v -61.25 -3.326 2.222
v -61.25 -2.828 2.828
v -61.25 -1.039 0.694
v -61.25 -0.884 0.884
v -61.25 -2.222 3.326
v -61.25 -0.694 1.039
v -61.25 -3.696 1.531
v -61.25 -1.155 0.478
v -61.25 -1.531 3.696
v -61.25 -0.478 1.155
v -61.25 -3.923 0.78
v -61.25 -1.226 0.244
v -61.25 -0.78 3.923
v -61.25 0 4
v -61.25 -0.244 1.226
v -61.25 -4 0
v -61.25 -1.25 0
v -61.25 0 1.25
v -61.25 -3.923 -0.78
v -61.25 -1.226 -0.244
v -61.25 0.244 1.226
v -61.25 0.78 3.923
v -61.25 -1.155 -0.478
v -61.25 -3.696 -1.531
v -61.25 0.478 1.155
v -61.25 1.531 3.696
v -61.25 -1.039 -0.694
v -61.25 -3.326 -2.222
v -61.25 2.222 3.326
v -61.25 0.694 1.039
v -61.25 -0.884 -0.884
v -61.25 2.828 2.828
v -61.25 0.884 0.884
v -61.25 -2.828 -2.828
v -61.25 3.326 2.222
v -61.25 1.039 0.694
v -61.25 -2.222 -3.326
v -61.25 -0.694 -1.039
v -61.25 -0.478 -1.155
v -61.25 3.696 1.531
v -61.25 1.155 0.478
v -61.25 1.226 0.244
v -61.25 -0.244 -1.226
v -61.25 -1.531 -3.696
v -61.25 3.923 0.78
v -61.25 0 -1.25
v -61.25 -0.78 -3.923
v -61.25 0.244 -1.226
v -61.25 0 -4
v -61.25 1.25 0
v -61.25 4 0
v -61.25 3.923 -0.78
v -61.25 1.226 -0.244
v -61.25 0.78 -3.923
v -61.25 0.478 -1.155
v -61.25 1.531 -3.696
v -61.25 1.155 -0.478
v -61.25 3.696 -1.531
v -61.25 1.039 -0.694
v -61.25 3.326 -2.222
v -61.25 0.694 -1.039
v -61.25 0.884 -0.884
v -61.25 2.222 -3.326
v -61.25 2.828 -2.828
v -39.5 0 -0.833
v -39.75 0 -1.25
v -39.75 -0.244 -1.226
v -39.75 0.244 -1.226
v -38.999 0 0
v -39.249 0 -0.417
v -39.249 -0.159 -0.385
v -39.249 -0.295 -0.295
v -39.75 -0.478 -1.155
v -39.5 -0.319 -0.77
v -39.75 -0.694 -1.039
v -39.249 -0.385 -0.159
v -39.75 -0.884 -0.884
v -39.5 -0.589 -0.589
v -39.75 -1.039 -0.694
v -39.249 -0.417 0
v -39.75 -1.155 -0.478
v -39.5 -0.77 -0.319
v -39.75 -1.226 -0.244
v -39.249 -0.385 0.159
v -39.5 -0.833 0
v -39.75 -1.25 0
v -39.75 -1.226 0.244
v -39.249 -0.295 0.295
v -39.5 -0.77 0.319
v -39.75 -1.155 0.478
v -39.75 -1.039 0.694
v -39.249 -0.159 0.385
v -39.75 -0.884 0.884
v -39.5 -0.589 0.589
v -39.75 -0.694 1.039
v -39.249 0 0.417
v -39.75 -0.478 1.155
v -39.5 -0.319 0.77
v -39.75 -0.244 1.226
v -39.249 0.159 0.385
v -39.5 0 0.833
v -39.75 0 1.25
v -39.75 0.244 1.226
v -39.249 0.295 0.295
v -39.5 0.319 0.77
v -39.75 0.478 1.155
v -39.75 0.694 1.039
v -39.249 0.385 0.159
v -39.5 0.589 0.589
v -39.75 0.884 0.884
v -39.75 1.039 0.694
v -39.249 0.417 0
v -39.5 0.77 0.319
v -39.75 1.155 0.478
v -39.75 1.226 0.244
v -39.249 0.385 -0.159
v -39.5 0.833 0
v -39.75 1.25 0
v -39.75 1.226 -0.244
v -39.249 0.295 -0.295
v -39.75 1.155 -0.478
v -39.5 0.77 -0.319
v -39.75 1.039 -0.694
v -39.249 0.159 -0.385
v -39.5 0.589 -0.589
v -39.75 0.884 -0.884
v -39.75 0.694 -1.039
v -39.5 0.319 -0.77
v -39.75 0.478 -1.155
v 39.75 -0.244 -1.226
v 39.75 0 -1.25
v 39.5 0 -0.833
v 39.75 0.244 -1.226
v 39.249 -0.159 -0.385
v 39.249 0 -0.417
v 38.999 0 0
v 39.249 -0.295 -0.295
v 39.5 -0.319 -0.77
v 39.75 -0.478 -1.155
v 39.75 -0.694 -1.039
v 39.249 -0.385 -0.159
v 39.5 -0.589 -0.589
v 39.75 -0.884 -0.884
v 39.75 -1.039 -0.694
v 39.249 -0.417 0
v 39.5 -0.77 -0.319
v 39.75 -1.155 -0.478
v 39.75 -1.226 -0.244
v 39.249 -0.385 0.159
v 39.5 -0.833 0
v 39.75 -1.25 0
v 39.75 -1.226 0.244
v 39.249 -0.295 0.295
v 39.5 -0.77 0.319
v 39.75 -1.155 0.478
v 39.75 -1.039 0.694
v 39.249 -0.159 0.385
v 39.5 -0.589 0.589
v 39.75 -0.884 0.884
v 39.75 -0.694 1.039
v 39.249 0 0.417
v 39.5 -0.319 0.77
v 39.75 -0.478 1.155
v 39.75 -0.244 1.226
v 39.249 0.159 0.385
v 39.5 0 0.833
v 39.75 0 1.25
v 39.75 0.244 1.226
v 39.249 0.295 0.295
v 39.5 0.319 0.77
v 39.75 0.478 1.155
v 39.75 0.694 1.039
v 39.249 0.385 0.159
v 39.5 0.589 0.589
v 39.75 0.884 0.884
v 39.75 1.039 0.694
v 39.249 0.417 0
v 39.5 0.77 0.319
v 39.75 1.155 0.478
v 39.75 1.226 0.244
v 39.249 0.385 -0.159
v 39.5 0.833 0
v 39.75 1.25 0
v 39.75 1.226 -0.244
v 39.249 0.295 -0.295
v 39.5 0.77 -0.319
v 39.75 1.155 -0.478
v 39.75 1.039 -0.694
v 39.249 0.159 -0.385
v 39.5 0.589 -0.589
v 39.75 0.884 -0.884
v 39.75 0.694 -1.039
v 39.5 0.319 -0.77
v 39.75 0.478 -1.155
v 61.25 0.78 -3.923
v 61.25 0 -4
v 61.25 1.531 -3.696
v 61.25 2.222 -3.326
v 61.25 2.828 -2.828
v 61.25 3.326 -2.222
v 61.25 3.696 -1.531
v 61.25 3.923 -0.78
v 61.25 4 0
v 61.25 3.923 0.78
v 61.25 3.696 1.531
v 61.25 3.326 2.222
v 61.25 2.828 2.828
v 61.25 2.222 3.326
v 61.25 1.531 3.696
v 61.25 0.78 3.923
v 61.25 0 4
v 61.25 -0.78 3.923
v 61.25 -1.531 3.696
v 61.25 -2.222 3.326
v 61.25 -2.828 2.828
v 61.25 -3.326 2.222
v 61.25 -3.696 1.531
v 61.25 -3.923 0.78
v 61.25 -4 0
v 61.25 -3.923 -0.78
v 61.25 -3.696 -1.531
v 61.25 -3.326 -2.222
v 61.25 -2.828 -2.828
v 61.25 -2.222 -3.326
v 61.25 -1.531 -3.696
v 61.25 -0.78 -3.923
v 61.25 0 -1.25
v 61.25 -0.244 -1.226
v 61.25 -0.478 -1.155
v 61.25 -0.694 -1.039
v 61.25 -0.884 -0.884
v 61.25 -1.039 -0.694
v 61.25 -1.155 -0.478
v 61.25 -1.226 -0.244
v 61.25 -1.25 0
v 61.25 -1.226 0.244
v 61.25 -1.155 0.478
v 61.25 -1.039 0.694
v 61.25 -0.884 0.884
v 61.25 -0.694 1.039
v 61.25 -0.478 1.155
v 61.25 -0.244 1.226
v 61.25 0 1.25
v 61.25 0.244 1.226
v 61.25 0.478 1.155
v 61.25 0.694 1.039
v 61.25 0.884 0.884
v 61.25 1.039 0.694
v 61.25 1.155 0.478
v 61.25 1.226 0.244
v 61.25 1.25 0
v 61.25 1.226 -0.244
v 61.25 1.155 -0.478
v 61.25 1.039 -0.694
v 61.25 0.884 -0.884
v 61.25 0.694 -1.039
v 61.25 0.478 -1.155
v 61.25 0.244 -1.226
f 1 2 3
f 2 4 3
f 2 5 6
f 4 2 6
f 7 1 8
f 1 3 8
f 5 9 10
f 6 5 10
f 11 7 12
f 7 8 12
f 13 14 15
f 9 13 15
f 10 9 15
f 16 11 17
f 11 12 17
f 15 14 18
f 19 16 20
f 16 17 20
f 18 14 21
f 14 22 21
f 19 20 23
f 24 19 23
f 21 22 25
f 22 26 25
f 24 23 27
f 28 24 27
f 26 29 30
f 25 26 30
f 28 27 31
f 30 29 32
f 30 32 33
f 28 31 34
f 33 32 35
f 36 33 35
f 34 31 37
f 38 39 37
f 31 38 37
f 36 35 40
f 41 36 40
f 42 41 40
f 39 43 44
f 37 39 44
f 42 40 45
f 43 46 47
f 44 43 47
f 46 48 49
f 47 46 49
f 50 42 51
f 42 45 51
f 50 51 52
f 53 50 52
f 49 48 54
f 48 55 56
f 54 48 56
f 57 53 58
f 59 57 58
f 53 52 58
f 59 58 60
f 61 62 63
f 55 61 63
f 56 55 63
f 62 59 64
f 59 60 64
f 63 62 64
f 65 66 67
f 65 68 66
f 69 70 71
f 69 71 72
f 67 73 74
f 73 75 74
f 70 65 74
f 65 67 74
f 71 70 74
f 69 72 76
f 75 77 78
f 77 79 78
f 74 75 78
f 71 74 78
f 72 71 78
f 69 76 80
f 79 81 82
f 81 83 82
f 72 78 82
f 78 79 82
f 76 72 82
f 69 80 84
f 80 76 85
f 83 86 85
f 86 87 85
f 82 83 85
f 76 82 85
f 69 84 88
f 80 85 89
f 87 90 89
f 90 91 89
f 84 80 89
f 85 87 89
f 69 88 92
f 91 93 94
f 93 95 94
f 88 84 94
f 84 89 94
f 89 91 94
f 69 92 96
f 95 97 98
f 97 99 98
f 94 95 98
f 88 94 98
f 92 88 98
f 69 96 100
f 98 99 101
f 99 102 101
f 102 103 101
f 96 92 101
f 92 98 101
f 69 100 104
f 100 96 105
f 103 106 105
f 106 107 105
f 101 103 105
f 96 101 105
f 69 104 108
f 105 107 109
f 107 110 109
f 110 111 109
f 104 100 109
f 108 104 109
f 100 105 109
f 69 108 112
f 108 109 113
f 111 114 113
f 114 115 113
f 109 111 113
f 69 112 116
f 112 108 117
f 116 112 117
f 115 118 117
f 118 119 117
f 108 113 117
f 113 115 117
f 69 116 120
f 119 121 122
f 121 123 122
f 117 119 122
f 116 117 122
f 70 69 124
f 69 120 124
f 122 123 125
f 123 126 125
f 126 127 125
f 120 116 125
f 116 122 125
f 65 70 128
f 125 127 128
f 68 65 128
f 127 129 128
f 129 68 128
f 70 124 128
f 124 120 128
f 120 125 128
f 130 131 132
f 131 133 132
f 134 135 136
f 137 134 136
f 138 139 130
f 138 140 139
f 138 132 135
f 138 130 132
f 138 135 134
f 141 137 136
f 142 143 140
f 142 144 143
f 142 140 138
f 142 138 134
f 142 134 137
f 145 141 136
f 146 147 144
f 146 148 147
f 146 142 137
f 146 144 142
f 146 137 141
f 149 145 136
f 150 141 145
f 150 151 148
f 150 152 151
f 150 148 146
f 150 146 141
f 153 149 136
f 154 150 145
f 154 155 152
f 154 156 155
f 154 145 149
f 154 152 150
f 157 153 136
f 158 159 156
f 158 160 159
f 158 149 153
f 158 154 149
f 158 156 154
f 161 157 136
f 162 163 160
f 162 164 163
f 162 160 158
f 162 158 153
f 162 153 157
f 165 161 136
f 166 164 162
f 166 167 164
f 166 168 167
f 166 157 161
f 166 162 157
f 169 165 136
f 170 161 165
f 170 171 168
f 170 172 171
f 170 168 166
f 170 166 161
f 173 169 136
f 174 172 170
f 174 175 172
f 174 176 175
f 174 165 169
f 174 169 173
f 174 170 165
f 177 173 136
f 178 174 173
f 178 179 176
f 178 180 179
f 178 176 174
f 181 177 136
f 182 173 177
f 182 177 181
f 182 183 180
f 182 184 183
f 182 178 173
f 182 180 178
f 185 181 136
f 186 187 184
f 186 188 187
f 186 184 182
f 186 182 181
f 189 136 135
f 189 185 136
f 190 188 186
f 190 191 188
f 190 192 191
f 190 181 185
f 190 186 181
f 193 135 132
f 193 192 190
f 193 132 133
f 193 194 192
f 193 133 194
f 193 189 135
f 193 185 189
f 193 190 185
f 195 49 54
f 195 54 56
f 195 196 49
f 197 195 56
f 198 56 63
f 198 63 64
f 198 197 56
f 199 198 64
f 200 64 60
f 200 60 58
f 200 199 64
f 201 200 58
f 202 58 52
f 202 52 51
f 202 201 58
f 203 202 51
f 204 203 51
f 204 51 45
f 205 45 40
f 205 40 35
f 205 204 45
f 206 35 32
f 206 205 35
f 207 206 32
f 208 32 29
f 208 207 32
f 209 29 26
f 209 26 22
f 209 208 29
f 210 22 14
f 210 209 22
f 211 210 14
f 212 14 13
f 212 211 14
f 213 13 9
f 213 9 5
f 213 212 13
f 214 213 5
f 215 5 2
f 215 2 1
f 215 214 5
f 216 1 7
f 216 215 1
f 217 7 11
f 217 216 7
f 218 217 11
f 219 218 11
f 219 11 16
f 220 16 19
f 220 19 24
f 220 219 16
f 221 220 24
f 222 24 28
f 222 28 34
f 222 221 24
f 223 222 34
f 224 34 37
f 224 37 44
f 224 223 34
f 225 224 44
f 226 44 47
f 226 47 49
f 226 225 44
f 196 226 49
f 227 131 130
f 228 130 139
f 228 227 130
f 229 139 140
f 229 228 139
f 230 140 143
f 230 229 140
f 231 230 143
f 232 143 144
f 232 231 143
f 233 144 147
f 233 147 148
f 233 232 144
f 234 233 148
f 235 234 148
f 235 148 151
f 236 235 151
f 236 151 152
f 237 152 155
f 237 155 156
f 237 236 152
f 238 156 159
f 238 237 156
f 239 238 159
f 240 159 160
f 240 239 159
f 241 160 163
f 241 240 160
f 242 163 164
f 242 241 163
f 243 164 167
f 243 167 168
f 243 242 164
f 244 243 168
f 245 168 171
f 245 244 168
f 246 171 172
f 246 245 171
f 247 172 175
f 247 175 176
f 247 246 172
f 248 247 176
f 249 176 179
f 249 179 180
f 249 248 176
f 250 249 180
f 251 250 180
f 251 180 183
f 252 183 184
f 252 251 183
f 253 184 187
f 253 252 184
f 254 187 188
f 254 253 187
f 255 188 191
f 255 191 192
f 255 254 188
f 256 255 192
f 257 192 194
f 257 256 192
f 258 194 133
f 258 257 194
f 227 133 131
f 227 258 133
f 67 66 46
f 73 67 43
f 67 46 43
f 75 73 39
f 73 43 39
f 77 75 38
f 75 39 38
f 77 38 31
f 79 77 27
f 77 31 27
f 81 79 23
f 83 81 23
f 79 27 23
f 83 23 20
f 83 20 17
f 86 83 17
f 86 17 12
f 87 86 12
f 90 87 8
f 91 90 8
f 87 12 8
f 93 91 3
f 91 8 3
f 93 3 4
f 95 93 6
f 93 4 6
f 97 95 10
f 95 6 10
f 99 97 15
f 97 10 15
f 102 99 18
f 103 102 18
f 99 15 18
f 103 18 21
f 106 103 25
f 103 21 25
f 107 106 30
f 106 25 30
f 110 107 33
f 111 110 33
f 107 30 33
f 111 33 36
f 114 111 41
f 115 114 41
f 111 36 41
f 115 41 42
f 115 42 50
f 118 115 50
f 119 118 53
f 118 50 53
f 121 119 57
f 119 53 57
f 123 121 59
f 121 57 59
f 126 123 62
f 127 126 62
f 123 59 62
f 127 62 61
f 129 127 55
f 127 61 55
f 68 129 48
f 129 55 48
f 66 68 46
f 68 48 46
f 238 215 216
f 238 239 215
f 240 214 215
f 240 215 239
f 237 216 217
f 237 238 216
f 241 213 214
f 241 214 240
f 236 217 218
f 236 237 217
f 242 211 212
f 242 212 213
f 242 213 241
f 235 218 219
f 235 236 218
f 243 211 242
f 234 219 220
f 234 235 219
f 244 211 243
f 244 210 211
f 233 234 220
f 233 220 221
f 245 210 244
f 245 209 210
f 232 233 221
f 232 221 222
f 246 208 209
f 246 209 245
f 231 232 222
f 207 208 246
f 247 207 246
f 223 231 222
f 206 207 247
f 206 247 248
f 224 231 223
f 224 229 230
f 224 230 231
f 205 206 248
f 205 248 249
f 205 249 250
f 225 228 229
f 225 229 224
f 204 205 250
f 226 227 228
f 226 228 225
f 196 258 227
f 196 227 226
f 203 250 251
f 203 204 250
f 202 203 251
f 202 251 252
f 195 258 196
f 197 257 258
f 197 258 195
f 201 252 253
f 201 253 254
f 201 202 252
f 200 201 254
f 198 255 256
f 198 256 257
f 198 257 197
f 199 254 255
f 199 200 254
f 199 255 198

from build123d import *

# Parameters (mm, degrees)
SKETCH_2_R      = 4
EXTRUDE_1_DEPTH = 61.25


with BuildPart() as part:
    # 스케치2 → 보스-돌출1 (new body)
    with BuildSketch(Plane(origin=(0, 0, 0), x_dir=(0, 0, -1), z_dir=(1, 0, 0))):
        Circle(SKETCH_2_R)
    extrude_1 = extrude(amount=EXTRUDE_1_DEPTH)

    # 스케치4 → M3x0.5 나사 구멍1 (revolve, cut)
    with BuildSketch(Plane(origin=(61.25, 0, 0), x_dir=(0, 0, -1), z_dir=(0, 1, 0))):
        Polygon((0, 0), (0, 22.251075774), (1.25, 21.5), (1.25, 0), align=None)
    m3x0_5_1 = revolve(axis=Axis((67.6, 0, 0), (-1, 0, 0)), mode=Mode.SUBTRACT)

    # 대칭 복사1: 보스-돌출1, M3x0.5 나사 구멍1 across plane
    add(extrude_1.mirror(Plane(origin=(0, 0, 0), x_dir=(0, 0, 1), z_dir=(1, 0, 0))))
    add(m3x0_5_1.mirror(Plane(origin=(0, 0, 0), x_dir=(0, 0, 1), z_dir=(1, 0, 0))), mode=Mode.SUBTRACT)


solid = part.part
